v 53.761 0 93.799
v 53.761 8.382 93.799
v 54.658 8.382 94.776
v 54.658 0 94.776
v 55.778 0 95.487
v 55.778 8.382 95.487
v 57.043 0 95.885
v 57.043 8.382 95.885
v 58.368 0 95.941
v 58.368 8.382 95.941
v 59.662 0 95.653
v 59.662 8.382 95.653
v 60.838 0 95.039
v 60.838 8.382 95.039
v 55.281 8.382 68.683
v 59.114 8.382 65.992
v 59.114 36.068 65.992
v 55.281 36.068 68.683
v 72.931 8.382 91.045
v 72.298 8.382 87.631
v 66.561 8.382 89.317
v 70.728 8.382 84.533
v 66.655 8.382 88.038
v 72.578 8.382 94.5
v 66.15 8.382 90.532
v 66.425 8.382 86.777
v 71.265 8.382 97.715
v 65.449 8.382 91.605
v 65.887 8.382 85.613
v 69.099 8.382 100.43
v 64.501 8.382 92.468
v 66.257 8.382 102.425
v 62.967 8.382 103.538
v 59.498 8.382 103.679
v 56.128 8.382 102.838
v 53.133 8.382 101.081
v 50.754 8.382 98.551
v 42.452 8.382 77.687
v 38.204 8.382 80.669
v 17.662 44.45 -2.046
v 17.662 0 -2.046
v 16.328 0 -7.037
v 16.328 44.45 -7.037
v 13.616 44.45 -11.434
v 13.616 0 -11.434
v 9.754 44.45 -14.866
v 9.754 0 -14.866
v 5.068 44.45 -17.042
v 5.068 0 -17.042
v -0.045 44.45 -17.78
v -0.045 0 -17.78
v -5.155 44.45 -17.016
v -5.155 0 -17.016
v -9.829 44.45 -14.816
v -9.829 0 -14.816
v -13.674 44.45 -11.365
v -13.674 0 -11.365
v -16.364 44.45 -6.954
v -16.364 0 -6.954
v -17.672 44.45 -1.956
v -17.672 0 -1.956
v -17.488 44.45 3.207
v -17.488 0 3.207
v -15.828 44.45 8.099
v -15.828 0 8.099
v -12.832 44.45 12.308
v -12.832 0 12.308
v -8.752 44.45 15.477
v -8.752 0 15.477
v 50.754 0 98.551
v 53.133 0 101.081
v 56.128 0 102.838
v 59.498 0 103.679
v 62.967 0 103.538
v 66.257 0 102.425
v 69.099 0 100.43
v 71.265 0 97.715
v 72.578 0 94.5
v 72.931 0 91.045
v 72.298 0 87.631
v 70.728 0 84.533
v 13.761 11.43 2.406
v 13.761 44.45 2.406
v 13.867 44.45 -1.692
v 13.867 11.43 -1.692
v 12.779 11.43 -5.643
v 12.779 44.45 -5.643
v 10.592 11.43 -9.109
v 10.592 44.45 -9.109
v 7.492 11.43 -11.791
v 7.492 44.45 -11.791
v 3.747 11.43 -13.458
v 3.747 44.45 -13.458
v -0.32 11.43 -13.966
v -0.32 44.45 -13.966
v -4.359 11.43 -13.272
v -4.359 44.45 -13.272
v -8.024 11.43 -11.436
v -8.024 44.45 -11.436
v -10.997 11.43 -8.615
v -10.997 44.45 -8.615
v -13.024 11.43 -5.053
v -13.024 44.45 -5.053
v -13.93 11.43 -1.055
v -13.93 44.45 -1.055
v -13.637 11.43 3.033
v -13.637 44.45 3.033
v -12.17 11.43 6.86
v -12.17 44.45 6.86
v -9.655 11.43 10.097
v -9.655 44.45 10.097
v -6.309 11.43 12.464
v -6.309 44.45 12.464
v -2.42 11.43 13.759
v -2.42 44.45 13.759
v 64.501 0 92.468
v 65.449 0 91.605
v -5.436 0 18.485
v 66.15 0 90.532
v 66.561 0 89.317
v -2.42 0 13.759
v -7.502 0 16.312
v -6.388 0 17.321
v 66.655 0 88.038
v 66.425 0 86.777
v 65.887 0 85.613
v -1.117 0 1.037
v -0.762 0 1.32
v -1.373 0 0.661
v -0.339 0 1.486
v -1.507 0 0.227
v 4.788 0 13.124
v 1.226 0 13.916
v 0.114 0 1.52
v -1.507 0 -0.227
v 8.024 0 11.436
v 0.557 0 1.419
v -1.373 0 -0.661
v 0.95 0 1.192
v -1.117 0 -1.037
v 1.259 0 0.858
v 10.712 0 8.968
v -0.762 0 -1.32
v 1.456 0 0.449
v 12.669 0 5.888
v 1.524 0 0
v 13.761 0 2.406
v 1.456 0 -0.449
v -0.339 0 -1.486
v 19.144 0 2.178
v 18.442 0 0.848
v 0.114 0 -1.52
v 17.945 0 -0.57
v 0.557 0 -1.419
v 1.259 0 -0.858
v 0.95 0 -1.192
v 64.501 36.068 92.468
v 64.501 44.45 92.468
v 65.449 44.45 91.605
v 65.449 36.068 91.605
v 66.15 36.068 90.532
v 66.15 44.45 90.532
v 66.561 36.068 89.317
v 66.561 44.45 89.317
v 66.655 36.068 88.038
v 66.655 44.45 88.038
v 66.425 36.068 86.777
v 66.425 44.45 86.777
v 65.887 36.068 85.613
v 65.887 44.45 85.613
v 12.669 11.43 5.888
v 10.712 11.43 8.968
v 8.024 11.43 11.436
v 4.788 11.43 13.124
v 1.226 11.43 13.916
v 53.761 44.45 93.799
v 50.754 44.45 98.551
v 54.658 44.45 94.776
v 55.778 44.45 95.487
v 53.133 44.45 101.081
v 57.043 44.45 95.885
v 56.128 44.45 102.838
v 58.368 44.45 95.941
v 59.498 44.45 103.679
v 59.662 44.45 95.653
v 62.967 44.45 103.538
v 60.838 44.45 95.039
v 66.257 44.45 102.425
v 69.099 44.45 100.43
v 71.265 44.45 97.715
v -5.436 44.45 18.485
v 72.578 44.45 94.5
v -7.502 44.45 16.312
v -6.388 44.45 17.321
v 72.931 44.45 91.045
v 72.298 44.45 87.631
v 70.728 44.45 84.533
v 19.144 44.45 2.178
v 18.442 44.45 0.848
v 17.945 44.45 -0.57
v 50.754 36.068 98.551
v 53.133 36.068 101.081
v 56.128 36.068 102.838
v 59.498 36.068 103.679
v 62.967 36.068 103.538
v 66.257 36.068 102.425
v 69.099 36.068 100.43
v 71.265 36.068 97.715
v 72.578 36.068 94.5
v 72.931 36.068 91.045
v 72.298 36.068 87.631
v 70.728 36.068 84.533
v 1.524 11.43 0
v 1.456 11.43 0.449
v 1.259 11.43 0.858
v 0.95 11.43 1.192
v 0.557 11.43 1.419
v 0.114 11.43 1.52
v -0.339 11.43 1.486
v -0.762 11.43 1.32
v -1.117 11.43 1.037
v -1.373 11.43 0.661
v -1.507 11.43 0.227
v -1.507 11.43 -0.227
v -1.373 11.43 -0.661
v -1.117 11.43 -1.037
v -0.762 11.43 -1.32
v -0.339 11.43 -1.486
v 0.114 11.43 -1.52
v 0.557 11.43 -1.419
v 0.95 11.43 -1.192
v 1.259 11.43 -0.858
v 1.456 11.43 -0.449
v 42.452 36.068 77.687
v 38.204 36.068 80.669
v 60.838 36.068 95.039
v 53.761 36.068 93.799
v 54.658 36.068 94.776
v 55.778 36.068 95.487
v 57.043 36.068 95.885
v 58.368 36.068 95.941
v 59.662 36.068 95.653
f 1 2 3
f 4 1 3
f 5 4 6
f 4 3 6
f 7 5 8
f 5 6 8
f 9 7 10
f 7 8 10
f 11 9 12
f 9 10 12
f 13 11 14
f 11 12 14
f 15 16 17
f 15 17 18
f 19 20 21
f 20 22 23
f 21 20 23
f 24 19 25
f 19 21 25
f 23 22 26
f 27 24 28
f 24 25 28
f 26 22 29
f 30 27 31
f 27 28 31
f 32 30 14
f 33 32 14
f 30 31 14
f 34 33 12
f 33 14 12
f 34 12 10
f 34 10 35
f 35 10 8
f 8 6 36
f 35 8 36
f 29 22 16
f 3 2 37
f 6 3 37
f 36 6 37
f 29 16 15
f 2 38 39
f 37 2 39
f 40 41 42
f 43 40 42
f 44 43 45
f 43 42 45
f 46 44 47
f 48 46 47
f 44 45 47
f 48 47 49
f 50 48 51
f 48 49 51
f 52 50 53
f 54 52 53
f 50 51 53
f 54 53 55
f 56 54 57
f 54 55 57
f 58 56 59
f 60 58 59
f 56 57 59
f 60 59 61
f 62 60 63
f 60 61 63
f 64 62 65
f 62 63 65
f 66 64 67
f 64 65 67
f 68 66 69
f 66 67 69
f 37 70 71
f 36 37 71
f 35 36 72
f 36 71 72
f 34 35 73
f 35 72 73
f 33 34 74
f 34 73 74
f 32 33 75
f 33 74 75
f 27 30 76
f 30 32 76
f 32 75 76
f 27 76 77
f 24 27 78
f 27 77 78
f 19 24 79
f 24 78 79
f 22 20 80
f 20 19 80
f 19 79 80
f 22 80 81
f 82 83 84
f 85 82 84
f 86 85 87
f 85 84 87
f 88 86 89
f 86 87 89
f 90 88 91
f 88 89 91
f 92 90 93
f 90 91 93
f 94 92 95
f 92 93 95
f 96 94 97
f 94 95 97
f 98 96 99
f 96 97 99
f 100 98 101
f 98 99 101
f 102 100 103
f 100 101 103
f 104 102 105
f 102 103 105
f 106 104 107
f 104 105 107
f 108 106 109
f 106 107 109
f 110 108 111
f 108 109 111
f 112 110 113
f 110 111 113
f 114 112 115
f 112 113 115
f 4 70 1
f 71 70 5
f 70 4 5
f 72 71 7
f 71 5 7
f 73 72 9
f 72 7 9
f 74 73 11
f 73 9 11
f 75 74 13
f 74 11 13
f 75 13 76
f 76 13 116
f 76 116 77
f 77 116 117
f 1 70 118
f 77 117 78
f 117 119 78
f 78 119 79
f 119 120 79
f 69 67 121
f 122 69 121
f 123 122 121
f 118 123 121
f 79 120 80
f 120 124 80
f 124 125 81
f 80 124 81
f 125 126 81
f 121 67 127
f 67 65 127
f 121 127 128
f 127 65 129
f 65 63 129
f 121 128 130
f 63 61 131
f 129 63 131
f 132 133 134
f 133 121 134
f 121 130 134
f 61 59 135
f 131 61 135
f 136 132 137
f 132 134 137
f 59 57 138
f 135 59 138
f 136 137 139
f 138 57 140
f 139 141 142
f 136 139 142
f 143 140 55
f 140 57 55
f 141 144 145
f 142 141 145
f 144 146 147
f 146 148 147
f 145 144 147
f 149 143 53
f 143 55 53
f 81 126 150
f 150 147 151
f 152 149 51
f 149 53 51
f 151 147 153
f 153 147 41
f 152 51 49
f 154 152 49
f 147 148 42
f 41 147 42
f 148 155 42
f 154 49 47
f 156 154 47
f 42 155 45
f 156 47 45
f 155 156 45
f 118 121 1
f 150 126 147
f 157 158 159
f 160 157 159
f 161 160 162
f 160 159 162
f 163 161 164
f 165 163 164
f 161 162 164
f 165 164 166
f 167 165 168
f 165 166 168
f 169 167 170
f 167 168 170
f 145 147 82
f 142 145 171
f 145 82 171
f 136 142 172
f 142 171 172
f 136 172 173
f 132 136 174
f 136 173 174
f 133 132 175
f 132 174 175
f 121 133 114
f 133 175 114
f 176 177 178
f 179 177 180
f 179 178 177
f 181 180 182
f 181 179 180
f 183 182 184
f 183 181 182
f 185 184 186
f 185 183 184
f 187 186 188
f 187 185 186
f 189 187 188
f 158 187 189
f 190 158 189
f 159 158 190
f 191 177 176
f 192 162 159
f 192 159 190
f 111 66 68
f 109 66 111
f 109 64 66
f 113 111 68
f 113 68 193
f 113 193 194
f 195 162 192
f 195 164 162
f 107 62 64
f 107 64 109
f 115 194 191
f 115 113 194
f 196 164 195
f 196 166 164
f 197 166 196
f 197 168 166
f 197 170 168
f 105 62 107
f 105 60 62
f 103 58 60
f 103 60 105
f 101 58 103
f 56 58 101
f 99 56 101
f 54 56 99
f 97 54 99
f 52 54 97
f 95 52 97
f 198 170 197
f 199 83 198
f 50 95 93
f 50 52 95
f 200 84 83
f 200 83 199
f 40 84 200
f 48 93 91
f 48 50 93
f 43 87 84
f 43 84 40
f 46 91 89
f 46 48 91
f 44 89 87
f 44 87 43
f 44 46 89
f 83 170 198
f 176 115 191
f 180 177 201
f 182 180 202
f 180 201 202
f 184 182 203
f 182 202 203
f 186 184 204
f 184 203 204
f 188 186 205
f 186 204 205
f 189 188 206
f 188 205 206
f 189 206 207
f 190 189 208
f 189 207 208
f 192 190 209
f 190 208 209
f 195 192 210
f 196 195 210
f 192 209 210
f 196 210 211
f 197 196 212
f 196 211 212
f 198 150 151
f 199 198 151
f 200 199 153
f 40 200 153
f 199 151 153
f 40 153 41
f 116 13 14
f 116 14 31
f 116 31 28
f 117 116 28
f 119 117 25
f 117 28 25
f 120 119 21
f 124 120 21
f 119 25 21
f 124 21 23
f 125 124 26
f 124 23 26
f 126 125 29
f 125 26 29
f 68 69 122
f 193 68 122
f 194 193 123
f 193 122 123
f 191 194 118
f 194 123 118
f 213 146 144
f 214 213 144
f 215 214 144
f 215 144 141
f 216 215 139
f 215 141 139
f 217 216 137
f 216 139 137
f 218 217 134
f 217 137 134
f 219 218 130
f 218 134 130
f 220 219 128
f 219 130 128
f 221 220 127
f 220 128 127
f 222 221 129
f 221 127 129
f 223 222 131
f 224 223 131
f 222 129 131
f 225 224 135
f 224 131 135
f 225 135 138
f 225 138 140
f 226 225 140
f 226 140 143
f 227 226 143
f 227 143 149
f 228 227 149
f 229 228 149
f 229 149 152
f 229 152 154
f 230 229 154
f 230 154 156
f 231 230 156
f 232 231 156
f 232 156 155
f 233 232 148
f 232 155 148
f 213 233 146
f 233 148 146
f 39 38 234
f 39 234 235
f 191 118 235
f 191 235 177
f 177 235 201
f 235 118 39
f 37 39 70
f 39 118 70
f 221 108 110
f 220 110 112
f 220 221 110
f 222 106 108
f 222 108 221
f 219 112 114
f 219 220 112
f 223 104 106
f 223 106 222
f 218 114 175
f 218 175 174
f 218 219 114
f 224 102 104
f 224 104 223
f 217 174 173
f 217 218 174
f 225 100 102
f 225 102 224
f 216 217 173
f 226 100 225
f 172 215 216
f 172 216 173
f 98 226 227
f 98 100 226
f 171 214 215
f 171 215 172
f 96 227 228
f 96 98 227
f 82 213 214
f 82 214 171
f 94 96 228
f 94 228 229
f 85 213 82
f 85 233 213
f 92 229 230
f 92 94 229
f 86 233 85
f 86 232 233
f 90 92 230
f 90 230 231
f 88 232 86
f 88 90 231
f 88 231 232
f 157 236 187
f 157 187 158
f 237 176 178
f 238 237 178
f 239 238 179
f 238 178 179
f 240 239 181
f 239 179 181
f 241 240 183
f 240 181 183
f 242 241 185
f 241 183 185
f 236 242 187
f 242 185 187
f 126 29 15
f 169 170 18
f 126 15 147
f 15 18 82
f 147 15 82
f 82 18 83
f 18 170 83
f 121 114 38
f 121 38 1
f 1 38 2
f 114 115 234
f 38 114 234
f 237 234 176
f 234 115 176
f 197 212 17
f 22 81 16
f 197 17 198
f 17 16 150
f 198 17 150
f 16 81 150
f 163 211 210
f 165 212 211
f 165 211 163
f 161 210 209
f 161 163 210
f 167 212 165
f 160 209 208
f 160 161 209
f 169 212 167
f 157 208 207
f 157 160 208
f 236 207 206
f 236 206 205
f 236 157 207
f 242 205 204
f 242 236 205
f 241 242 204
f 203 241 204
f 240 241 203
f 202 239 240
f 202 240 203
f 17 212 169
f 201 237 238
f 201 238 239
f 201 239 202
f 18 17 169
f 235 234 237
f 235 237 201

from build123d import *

# Parameters (mm, degrees)
BOSS_EXTRUDE1_DEPTH = 44.45
SKETCH2_R           = 13.97
CUT_EXTRUDE1_DEPTH  = 33.02
SKETCH4_R           = 1.524
CUT_EXTRUDE2_DEPTH  = 11.43
CUT_EXTRUDE4_DEPTH  = 44.45
SKETCH6_W           = 44.799560936
SKETCH6_H           = 27.686
CUT_EXTRUDE5_DEPTH  = 22.225


with BuildPart() as part:
    # Sketch1 → Boss-Extrude1 (new body)
    with BuildSketch(Plane(origin=(0, 0, 0), x_dir=(1, 0, 0), z_dir=(0, 1, 0))):
        with BuildLine():
            Line((-5.43632278, -18.484519804), (50.753878982, -98.550855941))
            ThreePointArc((50.753878982, -98.550855941), (67.749452613, -101.528977989), (70.727574662, -84.533404358))
            Line((70.727574662, -84.533404358), (19.143911472, -2.177551677))
            ThreePointArc((19.143911472, -2.177551677), (18.167371728, -0.148266421), (17.661854227, 2.046290613))
            ThreePointArc((17.661854227, 2.046290613), (-9.829221355, 14.816032112), (-8.751716681, -15.476945924))
            ThreePointArc((-8.751716681, -15.476945924), (-6.926324763, -16.795874604), (-5.43632278, -18.484519804))
        make_face()
    extrude(amount=BOSS_EXTRUDE1_DEPTH)

    # Sketch2 → Cut-Extrude1 (cut)
    with BuildSketch(Plane(origin=(0, 44.45, 0), x_dir=(1, 0, 0), z_dir=(0, 1, 0))):
        Circle(SKETCH2_R)
    extrude(amount=-CUT_EXTRUDE1_DEPTH, mode=Mode.SUBTRACT)

    # Sketch4 → Cut-Extrude2 (cut)
    with BuildSketch(Plane.XZ):
        Circle(SKETCH4_R)
    extrude(amount=-CUT_EXTRUDE2_DEPTH, mode=Mode.SUBTRACT)

    # Sketch5 → Cut-Extrude4 (cut)
    with BuildSketch(Plane(origin=(0, 44.45, 0), x_dir=(1, 0, 0), z_dir=(0, 1, 0))):
        with BuildLine():
            Line((-2.419955599, -13.758804995), (53.761320997, -93.799464422))
            ThreePointArc((53.761320997, -93.799464422), (57.042861973, -95.884776857), (60.837800413, -95.038915544))
            Line((60.837800413, -95.038915544), (64.500597561, -92.467964465))
            ThreePointArc((64.500597561, -92.467964465), (66.561253196, -89.317108071), (65.887093565, -85.613095861))
            Line((65.887093565, -85.613095861), (13.761291875, -2.405773456))
            ThreePointArc((13.761291875, -2.405773456), (8.023671754, -11.435977946), (-2.419955599, -13.758804995))
        make_face()
    extrude(amount=-CUT_EXTRUDE4_DEPTH, mode=Mode.SUBTRACT)

    # Sketch6 → Cut-Extrude5 (cut, symmetric)
    with BuildSketch(Plane(origin=(63.31167299, 0, 90.199232956), x_dir=(-0.8184971, 0, 0.574510659), z_dir=(-0.574510659, 0, -0.8184971))):
        with Locations((1.370623881, 22.225)):
            Rectangle(SKETCH6_W, SKETCH6_H)
    extrude(amount=CUT_EXTRUDE5_DEPTH, both=True, mode=Mode.SUBTRACT)


solid = part.part
